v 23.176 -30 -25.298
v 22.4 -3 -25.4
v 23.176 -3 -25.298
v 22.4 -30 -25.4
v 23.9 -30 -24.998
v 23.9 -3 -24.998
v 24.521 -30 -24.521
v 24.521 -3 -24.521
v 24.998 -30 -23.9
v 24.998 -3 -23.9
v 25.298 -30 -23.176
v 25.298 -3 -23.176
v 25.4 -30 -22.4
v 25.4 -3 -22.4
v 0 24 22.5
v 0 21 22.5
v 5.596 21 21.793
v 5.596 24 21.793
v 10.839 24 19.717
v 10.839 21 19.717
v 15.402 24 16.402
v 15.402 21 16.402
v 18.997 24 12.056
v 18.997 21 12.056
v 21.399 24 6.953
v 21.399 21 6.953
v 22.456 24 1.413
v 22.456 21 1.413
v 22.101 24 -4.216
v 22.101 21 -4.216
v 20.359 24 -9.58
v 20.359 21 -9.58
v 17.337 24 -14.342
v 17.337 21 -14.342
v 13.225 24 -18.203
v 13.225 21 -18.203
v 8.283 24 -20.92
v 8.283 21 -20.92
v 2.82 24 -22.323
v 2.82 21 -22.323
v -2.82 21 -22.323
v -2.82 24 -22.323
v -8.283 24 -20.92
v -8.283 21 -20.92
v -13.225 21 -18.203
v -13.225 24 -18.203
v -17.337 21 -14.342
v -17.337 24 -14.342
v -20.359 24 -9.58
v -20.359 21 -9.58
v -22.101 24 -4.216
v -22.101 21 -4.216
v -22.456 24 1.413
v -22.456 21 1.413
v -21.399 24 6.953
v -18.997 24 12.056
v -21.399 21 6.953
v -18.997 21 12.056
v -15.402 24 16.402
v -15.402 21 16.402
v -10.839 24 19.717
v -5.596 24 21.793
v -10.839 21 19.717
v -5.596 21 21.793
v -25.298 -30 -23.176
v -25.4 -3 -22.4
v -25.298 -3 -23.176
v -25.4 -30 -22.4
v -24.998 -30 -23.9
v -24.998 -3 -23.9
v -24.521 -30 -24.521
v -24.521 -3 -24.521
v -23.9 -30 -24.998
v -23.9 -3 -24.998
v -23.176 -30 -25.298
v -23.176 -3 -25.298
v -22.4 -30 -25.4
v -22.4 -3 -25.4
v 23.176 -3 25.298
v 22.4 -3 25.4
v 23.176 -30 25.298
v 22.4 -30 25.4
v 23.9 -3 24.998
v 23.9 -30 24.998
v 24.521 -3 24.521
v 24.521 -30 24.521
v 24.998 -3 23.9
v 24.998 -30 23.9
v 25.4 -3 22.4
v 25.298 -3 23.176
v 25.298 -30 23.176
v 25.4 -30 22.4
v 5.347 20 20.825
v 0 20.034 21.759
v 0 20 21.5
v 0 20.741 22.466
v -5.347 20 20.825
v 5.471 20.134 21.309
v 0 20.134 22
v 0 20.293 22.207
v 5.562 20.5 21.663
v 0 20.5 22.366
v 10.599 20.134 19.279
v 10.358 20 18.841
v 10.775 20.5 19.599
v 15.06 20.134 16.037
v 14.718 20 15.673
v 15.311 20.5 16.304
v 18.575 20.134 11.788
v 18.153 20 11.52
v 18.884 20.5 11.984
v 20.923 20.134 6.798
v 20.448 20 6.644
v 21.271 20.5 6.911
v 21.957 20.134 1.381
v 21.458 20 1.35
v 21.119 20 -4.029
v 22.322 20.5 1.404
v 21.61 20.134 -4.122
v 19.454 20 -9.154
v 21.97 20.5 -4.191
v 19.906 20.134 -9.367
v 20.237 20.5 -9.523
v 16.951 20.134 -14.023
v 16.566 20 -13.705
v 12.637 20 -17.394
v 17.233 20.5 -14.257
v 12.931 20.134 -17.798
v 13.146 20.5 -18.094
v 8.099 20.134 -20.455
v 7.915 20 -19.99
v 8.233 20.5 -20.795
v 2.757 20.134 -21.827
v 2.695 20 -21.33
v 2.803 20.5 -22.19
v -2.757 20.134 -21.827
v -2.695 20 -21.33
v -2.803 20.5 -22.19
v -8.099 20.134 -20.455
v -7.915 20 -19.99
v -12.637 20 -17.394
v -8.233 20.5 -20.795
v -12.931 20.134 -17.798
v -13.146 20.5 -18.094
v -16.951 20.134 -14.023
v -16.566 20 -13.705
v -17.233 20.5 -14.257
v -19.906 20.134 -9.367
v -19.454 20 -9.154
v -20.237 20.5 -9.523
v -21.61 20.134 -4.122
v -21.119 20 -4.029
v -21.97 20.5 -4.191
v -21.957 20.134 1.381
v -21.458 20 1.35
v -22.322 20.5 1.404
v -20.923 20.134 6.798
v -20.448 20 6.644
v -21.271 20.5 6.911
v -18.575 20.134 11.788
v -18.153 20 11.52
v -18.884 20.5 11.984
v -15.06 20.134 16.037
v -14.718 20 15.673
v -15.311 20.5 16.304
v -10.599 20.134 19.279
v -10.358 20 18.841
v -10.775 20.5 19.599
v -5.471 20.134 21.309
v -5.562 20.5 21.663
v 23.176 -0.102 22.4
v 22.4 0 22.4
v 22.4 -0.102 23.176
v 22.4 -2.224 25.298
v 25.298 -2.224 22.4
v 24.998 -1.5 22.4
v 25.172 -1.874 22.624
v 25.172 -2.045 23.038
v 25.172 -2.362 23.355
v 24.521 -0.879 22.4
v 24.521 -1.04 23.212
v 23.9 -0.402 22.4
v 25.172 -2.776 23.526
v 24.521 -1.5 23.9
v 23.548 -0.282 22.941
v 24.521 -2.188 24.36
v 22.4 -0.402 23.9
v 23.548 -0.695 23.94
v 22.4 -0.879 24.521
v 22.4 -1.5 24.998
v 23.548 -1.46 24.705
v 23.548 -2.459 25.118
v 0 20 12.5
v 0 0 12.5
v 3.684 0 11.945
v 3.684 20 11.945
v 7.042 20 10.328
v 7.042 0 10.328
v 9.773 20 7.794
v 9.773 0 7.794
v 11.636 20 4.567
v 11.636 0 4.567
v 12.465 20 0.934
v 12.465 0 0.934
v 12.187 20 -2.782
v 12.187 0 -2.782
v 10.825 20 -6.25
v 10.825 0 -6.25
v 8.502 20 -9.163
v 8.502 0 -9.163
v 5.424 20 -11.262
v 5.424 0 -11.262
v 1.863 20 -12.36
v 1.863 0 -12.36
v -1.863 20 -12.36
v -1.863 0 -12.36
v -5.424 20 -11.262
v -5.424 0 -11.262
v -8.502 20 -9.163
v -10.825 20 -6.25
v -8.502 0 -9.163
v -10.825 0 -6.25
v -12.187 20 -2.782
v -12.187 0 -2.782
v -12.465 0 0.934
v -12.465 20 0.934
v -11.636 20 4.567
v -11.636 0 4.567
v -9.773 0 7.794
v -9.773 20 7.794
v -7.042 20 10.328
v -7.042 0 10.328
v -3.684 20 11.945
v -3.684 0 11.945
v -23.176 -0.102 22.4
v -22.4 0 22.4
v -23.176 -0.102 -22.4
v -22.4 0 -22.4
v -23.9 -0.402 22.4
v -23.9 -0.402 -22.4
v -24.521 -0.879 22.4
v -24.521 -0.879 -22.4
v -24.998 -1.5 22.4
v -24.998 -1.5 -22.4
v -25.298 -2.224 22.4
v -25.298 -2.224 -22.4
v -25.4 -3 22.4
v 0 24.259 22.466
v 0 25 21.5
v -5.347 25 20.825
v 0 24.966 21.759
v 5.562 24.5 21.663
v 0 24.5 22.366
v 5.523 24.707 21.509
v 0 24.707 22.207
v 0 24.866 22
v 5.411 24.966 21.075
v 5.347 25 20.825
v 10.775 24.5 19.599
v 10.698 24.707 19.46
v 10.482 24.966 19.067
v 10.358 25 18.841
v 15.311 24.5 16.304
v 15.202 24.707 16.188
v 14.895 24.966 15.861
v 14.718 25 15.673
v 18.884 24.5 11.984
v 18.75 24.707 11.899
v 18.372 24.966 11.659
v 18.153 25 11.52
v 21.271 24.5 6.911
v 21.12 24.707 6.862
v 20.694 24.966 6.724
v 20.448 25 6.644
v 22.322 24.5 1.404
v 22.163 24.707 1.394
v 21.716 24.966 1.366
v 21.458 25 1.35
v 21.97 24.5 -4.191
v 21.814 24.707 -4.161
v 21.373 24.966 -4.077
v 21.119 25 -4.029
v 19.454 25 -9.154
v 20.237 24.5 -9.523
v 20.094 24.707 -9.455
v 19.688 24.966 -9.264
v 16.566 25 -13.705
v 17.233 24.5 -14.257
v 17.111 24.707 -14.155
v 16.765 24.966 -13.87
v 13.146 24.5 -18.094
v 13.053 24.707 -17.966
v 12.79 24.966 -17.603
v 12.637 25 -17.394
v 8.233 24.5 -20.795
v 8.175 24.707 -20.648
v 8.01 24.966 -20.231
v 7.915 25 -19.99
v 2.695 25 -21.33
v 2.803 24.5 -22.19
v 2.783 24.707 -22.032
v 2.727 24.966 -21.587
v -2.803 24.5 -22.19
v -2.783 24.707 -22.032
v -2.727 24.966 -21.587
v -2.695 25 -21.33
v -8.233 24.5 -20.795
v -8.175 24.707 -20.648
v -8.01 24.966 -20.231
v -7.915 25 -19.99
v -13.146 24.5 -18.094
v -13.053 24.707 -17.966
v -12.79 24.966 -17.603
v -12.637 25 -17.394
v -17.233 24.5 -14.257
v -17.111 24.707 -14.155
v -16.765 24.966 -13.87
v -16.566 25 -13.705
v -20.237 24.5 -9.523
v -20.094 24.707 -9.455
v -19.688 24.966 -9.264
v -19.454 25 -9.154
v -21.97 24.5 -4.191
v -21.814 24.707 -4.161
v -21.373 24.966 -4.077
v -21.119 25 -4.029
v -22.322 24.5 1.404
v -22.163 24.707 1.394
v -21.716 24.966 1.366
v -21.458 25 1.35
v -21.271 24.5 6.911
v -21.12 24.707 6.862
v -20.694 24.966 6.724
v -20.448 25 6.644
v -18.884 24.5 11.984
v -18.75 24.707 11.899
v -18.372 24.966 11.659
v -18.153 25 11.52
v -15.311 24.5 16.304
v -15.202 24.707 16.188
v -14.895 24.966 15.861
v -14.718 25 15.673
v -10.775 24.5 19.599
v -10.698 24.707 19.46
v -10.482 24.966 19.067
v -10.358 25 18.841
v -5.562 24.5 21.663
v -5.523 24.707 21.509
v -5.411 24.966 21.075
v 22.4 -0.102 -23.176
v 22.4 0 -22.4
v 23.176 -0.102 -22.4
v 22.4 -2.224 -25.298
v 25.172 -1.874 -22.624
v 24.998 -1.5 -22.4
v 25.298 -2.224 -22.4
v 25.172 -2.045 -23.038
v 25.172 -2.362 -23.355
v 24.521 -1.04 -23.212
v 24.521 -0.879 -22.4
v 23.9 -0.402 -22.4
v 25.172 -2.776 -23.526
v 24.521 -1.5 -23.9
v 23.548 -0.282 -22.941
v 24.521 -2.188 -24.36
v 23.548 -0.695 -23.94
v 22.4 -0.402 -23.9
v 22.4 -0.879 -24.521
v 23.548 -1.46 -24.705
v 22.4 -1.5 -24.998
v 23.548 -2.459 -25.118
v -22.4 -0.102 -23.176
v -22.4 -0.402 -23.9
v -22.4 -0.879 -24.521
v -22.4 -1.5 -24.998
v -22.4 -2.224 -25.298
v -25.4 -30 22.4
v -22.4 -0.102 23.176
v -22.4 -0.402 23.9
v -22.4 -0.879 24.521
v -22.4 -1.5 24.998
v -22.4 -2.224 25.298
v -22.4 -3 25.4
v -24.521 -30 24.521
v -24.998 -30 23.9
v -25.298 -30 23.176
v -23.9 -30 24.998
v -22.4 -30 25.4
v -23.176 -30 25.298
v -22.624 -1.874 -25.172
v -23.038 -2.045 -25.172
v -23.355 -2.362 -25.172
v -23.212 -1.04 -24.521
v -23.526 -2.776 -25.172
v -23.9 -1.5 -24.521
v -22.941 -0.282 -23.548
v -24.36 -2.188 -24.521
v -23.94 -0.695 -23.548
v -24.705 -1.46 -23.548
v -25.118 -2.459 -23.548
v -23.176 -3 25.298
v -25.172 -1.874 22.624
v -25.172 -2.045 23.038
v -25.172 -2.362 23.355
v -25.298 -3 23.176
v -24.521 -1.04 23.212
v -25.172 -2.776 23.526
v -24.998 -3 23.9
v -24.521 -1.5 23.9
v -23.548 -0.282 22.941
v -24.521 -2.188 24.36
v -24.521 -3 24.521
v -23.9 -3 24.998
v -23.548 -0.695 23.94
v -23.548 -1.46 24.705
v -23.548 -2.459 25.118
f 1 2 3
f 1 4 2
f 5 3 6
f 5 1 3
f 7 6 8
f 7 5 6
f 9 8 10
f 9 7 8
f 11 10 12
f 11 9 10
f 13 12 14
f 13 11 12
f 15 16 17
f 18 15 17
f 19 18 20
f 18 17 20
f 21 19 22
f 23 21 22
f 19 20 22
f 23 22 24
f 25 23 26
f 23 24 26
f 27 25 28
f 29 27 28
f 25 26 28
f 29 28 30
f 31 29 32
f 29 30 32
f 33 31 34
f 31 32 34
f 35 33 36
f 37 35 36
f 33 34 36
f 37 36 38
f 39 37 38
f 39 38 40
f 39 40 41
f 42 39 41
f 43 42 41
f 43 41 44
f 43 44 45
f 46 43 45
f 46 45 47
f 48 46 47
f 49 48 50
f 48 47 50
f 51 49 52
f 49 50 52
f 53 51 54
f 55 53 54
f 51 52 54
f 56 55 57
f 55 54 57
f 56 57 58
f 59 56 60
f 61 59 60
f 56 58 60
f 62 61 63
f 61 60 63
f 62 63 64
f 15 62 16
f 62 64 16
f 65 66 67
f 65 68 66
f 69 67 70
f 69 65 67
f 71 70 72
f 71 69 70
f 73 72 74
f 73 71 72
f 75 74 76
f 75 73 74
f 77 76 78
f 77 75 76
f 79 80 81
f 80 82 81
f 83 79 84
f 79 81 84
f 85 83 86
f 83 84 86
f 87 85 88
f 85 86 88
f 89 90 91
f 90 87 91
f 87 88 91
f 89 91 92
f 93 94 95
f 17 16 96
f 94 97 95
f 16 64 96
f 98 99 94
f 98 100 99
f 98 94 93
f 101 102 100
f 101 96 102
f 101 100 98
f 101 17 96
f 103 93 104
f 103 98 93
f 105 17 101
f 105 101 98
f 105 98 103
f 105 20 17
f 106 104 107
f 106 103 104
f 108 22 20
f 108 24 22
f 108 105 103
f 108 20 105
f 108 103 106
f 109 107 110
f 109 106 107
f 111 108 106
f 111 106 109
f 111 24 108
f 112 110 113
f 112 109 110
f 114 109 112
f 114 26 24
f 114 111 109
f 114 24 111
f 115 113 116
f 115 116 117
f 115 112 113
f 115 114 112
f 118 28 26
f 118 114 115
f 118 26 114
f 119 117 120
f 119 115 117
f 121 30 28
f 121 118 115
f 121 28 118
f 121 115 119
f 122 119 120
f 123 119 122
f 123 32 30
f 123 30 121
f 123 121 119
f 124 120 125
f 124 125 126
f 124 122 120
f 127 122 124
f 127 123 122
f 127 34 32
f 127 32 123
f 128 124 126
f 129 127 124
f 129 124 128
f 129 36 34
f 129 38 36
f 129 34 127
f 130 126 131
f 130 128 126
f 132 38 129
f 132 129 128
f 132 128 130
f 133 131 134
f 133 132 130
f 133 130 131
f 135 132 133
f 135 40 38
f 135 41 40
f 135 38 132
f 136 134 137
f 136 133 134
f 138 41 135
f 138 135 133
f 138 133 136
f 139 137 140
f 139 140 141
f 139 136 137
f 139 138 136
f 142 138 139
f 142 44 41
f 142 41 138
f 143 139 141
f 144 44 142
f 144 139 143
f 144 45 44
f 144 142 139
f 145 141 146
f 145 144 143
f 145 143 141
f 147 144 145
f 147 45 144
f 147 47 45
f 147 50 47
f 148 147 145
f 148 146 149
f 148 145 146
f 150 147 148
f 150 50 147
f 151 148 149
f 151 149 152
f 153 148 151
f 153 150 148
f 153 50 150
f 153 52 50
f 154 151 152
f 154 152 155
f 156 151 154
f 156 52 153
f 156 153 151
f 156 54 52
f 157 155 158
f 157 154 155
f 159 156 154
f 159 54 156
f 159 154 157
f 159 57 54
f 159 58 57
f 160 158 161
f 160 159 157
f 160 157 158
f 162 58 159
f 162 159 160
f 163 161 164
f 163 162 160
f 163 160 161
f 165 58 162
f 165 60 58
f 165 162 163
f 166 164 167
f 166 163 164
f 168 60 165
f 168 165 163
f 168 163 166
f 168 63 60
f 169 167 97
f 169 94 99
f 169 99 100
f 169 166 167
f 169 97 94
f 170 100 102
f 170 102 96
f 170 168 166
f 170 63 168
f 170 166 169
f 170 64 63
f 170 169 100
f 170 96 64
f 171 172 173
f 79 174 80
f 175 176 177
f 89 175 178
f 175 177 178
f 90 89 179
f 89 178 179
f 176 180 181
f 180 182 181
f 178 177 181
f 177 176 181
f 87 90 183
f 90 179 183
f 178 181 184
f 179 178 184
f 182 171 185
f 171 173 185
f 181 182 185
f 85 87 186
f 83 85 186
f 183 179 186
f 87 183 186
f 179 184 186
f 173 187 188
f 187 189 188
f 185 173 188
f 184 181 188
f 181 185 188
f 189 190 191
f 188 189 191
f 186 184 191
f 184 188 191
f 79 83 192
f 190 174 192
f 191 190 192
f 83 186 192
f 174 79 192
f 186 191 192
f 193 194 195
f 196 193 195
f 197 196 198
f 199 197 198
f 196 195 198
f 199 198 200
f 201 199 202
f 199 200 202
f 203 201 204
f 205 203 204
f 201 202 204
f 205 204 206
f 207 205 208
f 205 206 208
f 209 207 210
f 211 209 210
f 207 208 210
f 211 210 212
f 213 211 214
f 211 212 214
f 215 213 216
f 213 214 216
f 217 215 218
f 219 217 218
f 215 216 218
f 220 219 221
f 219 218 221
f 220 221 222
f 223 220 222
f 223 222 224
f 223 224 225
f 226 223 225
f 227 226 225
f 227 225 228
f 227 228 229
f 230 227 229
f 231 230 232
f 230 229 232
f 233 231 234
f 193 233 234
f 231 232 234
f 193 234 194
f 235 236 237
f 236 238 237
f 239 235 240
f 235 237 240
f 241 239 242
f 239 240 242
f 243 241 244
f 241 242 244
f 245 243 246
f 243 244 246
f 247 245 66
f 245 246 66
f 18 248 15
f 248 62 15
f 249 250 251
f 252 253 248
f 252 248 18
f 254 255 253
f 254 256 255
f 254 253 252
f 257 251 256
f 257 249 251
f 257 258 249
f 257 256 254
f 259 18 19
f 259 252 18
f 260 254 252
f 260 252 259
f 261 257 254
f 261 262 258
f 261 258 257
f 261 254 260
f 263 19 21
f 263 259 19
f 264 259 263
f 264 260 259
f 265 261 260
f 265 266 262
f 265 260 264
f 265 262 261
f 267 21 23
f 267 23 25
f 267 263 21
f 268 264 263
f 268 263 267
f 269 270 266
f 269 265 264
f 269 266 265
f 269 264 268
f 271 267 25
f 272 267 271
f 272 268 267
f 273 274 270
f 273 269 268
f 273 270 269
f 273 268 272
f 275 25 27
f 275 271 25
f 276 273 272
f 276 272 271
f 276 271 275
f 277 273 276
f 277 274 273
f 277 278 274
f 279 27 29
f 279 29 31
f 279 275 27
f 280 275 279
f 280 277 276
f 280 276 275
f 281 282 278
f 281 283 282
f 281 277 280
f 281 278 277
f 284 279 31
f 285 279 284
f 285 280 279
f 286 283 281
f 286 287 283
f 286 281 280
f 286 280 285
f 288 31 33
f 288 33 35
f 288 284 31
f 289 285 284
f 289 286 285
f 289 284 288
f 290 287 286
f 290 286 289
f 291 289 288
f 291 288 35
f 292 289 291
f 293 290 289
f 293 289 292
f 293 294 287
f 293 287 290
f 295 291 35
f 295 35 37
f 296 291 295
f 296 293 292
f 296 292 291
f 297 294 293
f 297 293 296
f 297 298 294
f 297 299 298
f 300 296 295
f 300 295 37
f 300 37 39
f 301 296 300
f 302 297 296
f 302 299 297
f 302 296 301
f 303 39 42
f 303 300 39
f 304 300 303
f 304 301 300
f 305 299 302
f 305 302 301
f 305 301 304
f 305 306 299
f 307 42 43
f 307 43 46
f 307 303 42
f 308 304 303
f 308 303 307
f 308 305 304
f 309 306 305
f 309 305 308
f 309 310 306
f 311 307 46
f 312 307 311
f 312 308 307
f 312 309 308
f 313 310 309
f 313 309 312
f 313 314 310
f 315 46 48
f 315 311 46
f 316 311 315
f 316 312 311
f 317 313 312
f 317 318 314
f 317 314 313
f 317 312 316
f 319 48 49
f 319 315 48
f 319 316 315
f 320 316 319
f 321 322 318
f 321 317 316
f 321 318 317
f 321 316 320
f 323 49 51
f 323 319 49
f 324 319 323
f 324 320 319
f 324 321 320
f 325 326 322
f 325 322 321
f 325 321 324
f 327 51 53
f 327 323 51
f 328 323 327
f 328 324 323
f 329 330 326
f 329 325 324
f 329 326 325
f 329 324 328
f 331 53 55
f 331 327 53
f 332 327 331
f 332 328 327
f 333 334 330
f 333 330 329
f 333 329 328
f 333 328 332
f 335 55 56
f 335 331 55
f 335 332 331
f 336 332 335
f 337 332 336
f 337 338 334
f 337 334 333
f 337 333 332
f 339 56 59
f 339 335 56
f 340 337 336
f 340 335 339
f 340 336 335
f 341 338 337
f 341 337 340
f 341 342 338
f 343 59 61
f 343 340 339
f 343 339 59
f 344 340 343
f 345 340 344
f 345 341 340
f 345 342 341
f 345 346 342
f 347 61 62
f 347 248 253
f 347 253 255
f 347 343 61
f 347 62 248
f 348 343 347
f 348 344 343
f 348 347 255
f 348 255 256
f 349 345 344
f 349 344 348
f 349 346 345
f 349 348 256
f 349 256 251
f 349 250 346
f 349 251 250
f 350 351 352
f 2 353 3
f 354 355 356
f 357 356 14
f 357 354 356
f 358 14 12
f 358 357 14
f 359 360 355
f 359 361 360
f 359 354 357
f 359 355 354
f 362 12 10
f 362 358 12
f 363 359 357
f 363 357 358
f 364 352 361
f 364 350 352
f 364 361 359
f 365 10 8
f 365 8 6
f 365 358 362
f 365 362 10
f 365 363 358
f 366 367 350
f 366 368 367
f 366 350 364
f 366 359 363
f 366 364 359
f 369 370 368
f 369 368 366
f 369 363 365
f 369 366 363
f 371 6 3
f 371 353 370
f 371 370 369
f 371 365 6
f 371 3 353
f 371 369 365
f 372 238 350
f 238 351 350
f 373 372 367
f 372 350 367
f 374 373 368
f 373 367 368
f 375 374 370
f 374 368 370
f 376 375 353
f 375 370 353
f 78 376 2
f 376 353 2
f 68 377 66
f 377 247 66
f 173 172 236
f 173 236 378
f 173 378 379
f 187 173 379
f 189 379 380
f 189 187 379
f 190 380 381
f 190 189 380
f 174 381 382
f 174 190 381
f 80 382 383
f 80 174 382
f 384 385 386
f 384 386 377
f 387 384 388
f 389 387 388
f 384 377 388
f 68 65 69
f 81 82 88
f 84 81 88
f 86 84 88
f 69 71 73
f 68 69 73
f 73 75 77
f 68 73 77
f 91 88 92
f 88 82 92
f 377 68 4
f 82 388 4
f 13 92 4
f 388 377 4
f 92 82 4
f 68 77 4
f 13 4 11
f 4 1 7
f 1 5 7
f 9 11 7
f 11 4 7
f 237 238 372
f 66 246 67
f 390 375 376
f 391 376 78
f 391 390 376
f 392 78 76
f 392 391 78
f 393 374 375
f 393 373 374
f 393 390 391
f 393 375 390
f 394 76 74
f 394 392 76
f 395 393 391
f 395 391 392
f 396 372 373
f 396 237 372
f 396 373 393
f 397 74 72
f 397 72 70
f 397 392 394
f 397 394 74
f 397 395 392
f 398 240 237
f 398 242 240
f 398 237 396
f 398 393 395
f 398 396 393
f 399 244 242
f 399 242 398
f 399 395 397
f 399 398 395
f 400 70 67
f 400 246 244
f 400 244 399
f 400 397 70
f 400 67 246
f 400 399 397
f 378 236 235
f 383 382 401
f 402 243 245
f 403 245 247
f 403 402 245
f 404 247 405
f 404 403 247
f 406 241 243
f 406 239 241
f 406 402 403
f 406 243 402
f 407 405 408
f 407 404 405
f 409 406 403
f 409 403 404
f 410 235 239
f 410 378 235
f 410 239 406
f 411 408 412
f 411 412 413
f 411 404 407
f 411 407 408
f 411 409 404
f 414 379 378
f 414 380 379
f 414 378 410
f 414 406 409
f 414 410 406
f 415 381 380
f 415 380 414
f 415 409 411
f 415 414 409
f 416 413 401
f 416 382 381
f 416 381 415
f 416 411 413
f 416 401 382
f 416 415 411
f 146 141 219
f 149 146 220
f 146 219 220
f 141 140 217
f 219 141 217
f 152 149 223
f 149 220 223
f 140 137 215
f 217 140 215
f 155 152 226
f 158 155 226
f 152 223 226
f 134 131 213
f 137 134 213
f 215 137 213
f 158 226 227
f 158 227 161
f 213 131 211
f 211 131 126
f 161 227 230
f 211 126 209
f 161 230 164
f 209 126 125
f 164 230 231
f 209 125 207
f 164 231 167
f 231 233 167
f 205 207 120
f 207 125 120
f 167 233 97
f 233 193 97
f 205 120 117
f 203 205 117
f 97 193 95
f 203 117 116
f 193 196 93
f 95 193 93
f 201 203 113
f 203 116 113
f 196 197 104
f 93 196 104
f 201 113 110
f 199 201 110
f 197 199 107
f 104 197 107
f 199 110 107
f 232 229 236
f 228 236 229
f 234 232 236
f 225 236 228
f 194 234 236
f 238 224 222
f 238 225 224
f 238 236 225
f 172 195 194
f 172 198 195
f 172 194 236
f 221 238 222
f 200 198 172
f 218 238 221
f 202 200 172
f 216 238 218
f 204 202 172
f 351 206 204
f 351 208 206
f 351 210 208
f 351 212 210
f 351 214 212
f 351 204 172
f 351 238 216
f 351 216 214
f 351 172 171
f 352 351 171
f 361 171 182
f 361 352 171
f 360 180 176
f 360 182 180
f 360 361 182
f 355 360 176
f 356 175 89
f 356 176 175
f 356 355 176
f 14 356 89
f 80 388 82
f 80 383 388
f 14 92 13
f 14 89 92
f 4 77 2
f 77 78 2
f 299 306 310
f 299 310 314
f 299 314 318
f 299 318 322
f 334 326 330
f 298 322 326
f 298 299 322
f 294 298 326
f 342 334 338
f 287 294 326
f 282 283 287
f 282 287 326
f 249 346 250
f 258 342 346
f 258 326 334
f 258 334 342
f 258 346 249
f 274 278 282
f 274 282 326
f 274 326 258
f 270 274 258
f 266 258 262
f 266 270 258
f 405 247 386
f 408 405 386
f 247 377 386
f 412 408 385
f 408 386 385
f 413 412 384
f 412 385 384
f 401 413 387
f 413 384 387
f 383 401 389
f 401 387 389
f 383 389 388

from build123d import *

# Parameters (mm, degrees)
SKETCH1_W           = 50.8
SKETCH1_H           = 50.8
BOSS_EXTRUDE1_DEPTH = 30
SKETCH2_R           = 12.5
BOSS_EXTRUDE2_DEPTH = 20
BOSS_EXTRUDE3_START = 20
SKETCH3_R           = 22.5
BOSS_EXTRUDE3_DEPTH = 5
FILLET1_R           = 3
FILLET2_R           = 1


with BuildPart() as part:
    # Sketch1 → Boss-Extrude1 (new body)
    with BuildSketch(Plane(origin=(0, 0, 0), x_dir=(1, 0, 0), z_dir=(0, 1, 0))):
        Rectangle(SKETCH1_W, SKETCH1_H)
    extrude(amount=-BOSS_EXTRUDE1_DEPTH)

    # Sketch2 → Boss-Extrude2 (add)
    with BuildSketch(Plane(origin=(0, 0, 0), x_dir=(1, 0, 0), z_dir=(0, 1, 0))):
        with Locations(Location((0, 0, 0), (0, 0, 270))):
            Circle(SKETCH2_R)
    extrude(amount=BOSS_EXTRUDE2_DEPTH)

    # Sketch3 → Boss-Extrude3 (add)
    with BuildSketch(Plane(origin=(0, 0, 0), x_dir=(1, 0, 0), z_dir=(0, 1, 0)).offset(BOSS_EXTRUDE3_START)):
        with Locations(Location((0, 0, 0), (0, 0, 270))):
            Circle(SKETCH3_R)
    extrude(amount=BOSS_EXTRUDE3_DEPTH)

    # Fillet1
    fillet1_edges = [part.edges().sort_by_distance(p)[0] for p in [
        (0, 0, 25.4),
        (-25.4, 0, 0),
        (0, 0, -25.4),
        (25.4, 0, 0),
        (25.4, -15, 25.4),
        (-25.4, -15, 25.4),
        (-25.4, -15, -25.4),
        (25.4, -15, -25.4),
    ]]
    fillet(fillet1_edges, radius=FILLET1_R)

    # Fillet2
    fillet2_edges = [part.edges().sort_by_distance(p)[0] for p in [
        (0, 20, -22.5),
        (0, 25, -22.5),
    ]]
    fillet(fillet2_edges, radius=FILLET2_R)


solid = part.part
